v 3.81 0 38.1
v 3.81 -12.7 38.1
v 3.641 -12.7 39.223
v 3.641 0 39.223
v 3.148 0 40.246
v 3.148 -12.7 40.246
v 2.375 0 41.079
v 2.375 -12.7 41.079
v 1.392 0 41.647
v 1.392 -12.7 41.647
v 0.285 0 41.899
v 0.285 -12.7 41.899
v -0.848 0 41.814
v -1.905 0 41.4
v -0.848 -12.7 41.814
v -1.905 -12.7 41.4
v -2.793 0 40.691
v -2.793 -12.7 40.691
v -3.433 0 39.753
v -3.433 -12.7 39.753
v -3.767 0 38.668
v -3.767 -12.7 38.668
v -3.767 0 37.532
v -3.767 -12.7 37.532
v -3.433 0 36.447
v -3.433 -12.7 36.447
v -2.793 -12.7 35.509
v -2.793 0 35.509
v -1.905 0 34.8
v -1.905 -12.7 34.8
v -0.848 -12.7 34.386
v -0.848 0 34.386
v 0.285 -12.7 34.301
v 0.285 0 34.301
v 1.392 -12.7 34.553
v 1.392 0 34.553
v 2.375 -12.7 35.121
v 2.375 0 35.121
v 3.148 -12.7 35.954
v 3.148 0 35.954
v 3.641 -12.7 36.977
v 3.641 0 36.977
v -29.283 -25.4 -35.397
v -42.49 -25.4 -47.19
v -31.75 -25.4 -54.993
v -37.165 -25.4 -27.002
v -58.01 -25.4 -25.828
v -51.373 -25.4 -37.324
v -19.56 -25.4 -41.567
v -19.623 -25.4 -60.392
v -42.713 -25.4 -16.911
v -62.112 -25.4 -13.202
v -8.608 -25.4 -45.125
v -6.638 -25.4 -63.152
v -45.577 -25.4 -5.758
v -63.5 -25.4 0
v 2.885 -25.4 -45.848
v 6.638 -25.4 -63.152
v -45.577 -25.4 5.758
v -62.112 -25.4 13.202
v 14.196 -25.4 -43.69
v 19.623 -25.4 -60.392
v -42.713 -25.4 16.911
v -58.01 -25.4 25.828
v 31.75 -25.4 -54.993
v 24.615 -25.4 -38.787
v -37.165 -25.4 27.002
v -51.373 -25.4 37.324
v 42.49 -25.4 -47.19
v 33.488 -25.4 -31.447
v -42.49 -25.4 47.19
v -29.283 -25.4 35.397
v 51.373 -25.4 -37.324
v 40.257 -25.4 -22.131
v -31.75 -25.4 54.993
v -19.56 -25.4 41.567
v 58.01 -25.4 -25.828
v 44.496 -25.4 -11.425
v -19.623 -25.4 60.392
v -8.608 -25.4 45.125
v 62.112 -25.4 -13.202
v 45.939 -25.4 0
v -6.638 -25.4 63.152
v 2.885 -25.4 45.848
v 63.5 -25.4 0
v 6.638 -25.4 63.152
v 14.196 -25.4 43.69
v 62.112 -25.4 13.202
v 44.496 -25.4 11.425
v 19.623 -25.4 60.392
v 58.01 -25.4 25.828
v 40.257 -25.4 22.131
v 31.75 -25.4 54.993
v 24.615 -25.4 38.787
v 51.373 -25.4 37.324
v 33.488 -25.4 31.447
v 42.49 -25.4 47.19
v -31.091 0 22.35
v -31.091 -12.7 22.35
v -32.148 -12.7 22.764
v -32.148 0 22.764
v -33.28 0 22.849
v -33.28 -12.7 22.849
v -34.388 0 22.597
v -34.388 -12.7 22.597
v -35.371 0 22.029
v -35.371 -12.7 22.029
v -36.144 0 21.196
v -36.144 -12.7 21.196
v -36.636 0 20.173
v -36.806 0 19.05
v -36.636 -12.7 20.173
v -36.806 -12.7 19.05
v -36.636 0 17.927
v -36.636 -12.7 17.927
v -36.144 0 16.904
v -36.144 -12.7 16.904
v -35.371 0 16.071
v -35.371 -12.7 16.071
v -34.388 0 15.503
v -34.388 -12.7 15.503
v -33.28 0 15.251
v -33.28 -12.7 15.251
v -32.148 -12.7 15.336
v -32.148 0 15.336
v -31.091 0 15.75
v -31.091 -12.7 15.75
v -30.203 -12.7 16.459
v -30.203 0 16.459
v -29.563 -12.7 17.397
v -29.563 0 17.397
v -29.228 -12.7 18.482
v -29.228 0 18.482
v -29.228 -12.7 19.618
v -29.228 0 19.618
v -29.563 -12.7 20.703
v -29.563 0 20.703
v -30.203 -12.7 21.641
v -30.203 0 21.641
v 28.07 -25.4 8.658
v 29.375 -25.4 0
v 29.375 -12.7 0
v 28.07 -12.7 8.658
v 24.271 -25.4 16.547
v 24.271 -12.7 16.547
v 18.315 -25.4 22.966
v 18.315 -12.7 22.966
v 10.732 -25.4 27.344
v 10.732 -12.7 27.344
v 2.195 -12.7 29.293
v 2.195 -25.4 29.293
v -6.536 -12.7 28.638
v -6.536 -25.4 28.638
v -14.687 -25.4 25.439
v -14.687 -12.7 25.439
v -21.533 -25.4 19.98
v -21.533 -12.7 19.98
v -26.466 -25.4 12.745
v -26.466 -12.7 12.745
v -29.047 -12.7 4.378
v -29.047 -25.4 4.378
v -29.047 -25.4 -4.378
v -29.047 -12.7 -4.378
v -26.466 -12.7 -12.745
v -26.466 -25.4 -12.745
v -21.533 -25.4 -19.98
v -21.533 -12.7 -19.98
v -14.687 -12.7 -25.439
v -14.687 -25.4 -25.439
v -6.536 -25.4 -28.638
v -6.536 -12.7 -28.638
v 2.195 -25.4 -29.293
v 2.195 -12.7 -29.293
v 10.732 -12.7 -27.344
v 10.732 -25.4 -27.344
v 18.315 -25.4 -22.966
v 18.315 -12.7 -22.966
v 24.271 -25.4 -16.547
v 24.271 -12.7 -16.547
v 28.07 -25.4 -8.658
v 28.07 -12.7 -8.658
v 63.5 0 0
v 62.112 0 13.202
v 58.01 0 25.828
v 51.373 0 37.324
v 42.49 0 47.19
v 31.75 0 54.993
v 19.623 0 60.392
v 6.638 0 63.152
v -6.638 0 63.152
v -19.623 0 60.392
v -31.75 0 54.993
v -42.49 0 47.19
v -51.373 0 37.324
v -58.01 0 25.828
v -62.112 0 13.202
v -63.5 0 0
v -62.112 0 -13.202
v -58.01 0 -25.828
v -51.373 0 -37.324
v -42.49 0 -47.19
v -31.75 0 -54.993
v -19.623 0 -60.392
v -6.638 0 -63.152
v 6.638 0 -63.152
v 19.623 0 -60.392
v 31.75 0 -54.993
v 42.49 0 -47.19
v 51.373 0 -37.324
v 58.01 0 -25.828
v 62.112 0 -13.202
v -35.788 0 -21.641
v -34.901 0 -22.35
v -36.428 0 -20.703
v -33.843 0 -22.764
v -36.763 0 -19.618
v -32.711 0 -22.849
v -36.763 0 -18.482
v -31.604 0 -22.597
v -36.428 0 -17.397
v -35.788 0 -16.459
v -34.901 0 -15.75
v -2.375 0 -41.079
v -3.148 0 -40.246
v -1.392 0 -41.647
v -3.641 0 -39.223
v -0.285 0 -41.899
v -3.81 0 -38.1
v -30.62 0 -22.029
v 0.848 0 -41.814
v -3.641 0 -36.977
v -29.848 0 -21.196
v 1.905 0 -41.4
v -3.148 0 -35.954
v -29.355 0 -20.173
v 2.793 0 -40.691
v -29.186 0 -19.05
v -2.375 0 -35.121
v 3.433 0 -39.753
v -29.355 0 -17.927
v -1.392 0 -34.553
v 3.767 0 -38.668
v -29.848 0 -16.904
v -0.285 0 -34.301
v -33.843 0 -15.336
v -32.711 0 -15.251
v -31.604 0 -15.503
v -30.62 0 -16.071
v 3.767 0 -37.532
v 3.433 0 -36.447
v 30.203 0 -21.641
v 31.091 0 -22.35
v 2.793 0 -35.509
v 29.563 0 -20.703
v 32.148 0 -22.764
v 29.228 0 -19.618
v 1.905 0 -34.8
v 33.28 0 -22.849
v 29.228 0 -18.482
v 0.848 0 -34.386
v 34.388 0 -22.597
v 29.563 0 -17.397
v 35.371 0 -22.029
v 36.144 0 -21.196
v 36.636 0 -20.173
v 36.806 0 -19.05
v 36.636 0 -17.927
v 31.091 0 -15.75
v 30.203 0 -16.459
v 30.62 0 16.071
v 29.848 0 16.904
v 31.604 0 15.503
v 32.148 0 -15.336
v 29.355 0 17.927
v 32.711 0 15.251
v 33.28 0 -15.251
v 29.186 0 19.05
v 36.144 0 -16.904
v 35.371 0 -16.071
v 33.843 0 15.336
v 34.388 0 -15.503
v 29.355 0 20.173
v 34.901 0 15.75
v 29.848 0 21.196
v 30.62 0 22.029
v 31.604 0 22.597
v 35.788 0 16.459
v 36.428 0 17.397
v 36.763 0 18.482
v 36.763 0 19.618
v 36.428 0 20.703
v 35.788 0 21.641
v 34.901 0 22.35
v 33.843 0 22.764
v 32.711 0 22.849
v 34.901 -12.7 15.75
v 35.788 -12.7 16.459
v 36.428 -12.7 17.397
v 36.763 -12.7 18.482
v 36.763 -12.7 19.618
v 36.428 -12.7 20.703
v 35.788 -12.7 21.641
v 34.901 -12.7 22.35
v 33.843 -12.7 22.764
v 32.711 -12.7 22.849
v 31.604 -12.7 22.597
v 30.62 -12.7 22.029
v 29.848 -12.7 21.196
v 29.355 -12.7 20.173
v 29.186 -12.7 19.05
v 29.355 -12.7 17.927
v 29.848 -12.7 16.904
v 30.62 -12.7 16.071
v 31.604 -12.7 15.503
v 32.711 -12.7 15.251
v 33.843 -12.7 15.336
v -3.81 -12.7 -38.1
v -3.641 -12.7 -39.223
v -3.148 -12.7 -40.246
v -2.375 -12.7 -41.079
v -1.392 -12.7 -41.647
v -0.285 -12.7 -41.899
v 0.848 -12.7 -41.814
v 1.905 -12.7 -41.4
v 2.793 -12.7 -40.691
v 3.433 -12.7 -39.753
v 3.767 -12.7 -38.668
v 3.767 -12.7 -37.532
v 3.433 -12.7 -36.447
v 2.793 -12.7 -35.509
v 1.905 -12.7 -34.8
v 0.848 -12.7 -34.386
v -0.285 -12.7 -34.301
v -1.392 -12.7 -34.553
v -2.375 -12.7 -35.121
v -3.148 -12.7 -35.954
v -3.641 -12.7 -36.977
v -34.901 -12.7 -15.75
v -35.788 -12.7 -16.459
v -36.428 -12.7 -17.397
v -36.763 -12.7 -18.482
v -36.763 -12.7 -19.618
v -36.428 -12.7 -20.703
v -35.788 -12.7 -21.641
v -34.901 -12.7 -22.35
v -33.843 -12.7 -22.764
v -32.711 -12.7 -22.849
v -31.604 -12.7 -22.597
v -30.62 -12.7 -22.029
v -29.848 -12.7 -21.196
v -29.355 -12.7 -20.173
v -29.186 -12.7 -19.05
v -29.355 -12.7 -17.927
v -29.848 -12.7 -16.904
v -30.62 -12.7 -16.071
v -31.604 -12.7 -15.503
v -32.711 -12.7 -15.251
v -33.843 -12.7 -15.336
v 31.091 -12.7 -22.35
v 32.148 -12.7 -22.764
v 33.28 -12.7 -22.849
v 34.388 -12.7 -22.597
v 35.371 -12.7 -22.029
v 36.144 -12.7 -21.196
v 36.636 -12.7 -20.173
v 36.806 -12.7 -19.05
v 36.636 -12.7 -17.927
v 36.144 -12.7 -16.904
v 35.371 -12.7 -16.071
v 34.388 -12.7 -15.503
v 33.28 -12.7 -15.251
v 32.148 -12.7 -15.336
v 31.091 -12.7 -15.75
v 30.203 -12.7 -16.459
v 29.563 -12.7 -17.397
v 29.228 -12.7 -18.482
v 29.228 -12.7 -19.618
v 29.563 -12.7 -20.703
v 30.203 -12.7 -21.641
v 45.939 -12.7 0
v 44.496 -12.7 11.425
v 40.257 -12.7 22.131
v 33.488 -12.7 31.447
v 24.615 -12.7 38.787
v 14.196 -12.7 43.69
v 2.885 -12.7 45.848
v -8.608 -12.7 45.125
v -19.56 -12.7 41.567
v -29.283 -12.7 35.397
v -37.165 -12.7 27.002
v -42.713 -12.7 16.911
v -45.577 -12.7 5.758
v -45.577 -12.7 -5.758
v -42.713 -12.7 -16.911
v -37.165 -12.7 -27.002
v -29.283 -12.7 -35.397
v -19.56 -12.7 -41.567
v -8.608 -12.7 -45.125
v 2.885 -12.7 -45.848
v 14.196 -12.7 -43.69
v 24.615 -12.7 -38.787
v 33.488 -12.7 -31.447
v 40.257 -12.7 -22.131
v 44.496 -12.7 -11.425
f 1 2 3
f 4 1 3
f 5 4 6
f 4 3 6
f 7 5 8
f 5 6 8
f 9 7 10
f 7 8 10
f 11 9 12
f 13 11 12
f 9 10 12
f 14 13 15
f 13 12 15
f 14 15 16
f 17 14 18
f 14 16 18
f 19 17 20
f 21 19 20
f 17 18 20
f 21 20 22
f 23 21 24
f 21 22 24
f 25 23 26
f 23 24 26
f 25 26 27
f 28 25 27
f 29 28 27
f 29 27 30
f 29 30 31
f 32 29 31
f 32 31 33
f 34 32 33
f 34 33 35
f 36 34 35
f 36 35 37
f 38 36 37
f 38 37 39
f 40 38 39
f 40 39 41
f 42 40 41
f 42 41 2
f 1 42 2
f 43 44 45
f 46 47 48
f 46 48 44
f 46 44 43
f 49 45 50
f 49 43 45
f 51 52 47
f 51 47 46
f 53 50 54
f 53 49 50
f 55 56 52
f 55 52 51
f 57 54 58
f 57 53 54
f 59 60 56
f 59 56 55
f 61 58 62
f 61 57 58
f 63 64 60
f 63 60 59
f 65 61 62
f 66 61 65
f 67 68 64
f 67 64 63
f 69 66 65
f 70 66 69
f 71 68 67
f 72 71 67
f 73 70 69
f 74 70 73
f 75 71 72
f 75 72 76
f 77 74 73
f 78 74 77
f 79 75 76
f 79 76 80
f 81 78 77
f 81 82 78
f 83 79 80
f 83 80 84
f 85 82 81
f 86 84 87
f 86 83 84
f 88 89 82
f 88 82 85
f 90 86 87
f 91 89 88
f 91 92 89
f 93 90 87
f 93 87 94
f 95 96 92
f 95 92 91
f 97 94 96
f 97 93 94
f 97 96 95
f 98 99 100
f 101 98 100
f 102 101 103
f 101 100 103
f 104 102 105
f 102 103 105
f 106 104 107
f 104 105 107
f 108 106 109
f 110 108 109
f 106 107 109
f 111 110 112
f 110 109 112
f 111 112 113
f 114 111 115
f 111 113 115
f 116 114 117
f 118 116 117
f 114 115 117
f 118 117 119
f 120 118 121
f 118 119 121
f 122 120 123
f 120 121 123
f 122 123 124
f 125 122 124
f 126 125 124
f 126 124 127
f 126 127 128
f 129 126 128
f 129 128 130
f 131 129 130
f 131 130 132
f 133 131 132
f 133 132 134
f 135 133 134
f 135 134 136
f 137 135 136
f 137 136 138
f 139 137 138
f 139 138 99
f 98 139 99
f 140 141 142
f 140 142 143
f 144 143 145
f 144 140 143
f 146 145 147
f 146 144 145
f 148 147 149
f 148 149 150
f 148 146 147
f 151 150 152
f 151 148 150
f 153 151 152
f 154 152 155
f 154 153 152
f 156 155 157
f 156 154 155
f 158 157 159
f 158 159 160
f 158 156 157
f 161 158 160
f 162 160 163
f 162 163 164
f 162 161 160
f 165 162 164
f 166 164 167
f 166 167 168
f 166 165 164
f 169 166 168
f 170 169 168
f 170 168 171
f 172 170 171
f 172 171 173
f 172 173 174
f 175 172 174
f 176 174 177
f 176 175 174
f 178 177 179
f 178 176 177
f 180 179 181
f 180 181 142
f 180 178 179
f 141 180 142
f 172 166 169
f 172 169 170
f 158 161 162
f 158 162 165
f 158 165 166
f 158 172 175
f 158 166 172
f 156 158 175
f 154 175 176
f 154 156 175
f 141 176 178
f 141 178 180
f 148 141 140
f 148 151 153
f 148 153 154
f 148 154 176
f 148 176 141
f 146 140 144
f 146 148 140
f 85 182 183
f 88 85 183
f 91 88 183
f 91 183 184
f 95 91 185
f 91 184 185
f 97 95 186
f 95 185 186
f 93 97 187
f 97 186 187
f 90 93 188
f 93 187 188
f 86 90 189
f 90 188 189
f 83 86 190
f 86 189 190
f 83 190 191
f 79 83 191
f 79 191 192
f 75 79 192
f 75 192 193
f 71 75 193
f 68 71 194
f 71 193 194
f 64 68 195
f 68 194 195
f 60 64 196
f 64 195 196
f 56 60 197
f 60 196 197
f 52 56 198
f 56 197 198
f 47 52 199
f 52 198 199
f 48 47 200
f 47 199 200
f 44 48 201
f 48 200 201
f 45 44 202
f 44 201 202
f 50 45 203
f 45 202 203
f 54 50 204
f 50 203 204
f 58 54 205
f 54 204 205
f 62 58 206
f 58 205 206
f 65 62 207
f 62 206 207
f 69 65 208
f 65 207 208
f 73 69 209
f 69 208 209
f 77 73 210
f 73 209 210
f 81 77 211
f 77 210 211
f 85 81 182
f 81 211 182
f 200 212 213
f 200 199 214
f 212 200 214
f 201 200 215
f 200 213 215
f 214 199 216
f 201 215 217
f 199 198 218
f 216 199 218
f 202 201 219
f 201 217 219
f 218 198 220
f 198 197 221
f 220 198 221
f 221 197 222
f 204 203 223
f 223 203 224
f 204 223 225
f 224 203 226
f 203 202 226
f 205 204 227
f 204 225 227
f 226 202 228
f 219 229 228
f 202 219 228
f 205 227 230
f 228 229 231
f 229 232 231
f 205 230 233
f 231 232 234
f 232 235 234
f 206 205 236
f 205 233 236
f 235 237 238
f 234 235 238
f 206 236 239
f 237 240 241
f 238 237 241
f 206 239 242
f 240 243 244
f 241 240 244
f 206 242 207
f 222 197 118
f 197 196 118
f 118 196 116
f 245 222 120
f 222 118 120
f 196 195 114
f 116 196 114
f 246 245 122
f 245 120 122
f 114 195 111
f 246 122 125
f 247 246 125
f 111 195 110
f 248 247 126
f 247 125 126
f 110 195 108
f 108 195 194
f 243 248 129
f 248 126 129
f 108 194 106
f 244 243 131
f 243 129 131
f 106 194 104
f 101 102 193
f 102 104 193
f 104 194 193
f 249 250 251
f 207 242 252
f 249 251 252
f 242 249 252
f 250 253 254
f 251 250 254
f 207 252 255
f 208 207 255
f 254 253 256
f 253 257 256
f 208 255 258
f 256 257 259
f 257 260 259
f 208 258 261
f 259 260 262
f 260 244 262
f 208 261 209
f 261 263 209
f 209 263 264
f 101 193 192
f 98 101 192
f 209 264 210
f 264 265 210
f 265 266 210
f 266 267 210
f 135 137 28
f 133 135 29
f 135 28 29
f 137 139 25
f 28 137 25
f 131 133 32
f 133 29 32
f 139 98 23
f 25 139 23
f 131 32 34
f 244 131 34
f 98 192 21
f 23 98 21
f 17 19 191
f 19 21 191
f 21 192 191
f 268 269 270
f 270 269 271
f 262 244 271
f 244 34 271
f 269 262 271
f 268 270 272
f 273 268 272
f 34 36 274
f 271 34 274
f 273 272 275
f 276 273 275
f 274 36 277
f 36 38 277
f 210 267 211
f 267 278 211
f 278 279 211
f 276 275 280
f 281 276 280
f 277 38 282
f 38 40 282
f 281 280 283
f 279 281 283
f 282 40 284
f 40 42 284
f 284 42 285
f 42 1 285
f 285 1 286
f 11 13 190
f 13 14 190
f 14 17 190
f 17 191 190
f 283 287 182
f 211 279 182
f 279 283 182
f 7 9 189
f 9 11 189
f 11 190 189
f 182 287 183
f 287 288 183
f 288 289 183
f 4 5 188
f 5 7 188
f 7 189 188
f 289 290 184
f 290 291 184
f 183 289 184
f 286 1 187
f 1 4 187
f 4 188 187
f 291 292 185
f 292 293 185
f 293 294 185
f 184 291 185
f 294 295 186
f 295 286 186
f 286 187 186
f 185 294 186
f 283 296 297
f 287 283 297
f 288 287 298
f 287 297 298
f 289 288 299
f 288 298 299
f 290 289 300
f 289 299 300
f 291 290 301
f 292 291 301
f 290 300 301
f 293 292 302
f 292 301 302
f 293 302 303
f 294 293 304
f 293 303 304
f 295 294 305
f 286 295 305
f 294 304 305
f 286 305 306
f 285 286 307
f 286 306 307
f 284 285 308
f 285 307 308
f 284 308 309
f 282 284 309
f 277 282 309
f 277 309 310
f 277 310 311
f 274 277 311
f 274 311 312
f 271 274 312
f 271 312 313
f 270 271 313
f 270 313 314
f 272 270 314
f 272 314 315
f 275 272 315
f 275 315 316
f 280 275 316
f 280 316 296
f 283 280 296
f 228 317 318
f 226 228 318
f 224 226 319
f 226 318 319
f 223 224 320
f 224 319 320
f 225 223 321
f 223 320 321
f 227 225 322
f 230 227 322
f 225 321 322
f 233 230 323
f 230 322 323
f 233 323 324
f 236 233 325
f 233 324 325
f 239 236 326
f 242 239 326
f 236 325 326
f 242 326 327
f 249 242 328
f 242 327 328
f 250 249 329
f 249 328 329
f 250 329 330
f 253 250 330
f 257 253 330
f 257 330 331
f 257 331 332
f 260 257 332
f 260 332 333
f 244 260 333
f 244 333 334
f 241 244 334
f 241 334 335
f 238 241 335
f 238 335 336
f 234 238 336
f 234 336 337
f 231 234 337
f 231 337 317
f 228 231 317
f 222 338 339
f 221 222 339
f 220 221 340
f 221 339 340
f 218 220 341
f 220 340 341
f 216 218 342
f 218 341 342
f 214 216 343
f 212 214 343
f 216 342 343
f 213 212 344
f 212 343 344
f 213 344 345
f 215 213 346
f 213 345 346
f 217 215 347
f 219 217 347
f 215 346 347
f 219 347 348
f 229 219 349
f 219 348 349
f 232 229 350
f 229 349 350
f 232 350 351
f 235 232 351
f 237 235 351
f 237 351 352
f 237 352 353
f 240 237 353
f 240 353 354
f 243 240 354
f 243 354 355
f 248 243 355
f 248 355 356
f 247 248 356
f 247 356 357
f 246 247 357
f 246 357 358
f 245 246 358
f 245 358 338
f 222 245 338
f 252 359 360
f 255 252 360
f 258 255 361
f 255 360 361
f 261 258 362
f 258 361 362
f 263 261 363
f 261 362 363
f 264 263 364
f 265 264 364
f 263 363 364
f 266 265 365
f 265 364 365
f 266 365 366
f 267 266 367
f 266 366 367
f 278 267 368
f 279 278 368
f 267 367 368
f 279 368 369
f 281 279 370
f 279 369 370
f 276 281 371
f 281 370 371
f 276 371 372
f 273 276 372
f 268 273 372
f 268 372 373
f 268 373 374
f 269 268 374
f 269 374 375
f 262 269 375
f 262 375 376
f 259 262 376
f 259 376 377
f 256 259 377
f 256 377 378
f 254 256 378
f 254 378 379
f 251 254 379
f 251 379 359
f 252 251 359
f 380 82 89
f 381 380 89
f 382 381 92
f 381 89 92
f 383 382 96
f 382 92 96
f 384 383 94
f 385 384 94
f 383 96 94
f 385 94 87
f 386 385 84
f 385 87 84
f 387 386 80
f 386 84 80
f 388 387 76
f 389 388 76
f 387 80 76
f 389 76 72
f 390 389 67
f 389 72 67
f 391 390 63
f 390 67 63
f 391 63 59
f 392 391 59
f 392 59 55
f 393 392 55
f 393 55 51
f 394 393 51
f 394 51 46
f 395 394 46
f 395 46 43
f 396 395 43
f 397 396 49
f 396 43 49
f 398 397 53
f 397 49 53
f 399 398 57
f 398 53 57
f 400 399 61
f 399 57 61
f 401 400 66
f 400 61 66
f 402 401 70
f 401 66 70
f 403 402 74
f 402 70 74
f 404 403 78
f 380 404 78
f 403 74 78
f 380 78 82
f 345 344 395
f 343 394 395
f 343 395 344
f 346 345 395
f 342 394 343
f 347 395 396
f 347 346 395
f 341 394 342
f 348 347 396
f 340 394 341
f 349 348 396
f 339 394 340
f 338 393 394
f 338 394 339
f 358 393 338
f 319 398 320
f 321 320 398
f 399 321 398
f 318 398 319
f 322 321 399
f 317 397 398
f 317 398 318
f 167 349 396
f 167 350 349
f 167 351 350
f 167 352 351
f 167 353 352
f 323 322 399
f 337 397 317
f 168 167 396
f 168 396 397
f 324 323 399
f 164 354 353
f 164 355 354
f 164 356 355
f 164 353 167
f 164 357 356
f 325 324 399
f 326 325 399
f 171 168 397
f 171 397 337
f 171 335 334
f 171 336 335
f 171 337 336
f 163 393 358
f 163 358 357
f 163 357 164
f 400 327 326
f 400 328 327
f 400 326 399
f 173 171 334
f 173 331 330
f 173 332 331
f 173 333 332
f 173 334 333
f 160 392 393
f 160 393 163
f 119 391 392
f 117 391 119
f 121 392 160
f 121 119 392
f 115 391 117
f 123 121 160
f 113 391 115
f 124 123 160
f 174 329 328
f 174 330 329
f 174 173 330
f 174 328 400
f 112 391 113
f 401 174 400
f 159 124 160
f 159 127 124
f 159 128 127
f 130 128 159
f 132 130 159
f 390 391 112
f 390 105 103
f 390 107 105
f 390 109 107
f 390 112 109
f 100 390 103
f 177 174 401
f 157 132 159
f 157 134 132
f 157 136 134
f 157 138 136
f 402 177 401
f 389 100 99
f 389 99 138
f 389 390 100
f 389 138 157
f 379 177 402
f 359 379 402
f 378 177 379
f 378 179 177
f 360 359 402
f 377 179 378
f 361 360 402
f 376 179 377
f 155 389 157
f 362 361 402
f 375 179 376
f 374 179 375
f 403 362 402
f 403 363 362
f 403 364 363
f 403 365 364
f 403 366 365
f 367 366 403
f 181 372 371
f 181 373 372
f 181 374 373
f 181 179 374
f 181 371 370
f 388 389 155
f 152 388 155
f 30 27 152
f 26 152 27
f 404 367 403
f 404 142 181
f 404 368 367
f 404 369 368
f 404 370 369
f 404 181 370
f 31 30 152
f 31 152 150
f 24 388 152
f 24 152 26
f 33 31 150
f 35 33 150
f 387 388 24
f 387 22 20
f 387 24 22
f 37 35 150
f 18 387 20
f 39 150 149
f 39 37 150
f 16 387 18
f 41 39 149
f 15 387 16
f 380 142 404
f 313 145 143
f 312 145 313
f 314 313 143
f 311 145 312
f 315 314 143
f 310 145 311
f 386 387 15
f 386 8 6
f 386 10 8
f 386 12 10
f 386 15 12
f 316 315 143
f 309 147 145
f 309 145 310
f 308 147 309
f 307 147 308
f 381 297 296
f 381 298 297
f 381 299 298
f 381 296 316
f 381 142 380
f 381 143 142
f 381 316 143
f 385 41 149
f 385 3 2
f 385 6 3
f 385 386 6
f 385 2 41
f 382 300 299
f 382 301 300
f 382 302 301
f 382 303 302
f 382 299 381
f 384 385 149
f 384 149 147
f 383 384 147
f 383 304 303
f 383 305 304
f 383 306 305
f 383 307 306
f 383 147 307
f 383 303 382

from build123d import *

# Parameters (mm, degrees)
F0_R            = 63.5
F1_DEPTH        = 25.4
F2_R            = 45.938884012
F2_R_2          = 29.3747144419
F3_DEPTH        = 12.7
F4_R            = 3.81
F5_DEPTH        = 12.701
F5_COPIES_COUNT = 6


# Not quite as in the source:
# - a pattern or mirror of a feature is missing from the dataset's text; its kind, count and spacing are read off the source's solid


with BuildPart() as f1:
    # F0 (on Front) → F1 (new body)
    with BuildSketch(Plane.XZ):
        Circle(F0_R)
    extrude(amount=F1_DEPTH)

    # F2 (on face) → F3 (cut)
    with BuildSketch(Plane.XZ.offset(25.4)):
        Circle(F2_R)
        Circle(F2_R_2, mode=Mode.SUBTRACT)
    extrude(amount=-F3_DEPTH, mode=Mode.SUBTRACT)

    # F4 (on face) → F5 (cut, through all)
    with BuildSketch(Plane.XZ.offset(12.7)):
        with Locations((0, 38.1)):
            Circle(F4_R)
    f5 = extrude(amount=-F5_DEPTH, mode=Mode.SUBTRACT)

    # F5_copies: F5 ×6 about axis
    f5_copies_axis = Axis((0, 0, 0), (0, 1, 0))
    for i in range(1, F5_COPIES_COUNT):
        add(f5.rotate(f5_copies_axis, i * 360 / F5_COPIES_COUNT), mode=Mode.SUBTRACT)


solid = f1.part
